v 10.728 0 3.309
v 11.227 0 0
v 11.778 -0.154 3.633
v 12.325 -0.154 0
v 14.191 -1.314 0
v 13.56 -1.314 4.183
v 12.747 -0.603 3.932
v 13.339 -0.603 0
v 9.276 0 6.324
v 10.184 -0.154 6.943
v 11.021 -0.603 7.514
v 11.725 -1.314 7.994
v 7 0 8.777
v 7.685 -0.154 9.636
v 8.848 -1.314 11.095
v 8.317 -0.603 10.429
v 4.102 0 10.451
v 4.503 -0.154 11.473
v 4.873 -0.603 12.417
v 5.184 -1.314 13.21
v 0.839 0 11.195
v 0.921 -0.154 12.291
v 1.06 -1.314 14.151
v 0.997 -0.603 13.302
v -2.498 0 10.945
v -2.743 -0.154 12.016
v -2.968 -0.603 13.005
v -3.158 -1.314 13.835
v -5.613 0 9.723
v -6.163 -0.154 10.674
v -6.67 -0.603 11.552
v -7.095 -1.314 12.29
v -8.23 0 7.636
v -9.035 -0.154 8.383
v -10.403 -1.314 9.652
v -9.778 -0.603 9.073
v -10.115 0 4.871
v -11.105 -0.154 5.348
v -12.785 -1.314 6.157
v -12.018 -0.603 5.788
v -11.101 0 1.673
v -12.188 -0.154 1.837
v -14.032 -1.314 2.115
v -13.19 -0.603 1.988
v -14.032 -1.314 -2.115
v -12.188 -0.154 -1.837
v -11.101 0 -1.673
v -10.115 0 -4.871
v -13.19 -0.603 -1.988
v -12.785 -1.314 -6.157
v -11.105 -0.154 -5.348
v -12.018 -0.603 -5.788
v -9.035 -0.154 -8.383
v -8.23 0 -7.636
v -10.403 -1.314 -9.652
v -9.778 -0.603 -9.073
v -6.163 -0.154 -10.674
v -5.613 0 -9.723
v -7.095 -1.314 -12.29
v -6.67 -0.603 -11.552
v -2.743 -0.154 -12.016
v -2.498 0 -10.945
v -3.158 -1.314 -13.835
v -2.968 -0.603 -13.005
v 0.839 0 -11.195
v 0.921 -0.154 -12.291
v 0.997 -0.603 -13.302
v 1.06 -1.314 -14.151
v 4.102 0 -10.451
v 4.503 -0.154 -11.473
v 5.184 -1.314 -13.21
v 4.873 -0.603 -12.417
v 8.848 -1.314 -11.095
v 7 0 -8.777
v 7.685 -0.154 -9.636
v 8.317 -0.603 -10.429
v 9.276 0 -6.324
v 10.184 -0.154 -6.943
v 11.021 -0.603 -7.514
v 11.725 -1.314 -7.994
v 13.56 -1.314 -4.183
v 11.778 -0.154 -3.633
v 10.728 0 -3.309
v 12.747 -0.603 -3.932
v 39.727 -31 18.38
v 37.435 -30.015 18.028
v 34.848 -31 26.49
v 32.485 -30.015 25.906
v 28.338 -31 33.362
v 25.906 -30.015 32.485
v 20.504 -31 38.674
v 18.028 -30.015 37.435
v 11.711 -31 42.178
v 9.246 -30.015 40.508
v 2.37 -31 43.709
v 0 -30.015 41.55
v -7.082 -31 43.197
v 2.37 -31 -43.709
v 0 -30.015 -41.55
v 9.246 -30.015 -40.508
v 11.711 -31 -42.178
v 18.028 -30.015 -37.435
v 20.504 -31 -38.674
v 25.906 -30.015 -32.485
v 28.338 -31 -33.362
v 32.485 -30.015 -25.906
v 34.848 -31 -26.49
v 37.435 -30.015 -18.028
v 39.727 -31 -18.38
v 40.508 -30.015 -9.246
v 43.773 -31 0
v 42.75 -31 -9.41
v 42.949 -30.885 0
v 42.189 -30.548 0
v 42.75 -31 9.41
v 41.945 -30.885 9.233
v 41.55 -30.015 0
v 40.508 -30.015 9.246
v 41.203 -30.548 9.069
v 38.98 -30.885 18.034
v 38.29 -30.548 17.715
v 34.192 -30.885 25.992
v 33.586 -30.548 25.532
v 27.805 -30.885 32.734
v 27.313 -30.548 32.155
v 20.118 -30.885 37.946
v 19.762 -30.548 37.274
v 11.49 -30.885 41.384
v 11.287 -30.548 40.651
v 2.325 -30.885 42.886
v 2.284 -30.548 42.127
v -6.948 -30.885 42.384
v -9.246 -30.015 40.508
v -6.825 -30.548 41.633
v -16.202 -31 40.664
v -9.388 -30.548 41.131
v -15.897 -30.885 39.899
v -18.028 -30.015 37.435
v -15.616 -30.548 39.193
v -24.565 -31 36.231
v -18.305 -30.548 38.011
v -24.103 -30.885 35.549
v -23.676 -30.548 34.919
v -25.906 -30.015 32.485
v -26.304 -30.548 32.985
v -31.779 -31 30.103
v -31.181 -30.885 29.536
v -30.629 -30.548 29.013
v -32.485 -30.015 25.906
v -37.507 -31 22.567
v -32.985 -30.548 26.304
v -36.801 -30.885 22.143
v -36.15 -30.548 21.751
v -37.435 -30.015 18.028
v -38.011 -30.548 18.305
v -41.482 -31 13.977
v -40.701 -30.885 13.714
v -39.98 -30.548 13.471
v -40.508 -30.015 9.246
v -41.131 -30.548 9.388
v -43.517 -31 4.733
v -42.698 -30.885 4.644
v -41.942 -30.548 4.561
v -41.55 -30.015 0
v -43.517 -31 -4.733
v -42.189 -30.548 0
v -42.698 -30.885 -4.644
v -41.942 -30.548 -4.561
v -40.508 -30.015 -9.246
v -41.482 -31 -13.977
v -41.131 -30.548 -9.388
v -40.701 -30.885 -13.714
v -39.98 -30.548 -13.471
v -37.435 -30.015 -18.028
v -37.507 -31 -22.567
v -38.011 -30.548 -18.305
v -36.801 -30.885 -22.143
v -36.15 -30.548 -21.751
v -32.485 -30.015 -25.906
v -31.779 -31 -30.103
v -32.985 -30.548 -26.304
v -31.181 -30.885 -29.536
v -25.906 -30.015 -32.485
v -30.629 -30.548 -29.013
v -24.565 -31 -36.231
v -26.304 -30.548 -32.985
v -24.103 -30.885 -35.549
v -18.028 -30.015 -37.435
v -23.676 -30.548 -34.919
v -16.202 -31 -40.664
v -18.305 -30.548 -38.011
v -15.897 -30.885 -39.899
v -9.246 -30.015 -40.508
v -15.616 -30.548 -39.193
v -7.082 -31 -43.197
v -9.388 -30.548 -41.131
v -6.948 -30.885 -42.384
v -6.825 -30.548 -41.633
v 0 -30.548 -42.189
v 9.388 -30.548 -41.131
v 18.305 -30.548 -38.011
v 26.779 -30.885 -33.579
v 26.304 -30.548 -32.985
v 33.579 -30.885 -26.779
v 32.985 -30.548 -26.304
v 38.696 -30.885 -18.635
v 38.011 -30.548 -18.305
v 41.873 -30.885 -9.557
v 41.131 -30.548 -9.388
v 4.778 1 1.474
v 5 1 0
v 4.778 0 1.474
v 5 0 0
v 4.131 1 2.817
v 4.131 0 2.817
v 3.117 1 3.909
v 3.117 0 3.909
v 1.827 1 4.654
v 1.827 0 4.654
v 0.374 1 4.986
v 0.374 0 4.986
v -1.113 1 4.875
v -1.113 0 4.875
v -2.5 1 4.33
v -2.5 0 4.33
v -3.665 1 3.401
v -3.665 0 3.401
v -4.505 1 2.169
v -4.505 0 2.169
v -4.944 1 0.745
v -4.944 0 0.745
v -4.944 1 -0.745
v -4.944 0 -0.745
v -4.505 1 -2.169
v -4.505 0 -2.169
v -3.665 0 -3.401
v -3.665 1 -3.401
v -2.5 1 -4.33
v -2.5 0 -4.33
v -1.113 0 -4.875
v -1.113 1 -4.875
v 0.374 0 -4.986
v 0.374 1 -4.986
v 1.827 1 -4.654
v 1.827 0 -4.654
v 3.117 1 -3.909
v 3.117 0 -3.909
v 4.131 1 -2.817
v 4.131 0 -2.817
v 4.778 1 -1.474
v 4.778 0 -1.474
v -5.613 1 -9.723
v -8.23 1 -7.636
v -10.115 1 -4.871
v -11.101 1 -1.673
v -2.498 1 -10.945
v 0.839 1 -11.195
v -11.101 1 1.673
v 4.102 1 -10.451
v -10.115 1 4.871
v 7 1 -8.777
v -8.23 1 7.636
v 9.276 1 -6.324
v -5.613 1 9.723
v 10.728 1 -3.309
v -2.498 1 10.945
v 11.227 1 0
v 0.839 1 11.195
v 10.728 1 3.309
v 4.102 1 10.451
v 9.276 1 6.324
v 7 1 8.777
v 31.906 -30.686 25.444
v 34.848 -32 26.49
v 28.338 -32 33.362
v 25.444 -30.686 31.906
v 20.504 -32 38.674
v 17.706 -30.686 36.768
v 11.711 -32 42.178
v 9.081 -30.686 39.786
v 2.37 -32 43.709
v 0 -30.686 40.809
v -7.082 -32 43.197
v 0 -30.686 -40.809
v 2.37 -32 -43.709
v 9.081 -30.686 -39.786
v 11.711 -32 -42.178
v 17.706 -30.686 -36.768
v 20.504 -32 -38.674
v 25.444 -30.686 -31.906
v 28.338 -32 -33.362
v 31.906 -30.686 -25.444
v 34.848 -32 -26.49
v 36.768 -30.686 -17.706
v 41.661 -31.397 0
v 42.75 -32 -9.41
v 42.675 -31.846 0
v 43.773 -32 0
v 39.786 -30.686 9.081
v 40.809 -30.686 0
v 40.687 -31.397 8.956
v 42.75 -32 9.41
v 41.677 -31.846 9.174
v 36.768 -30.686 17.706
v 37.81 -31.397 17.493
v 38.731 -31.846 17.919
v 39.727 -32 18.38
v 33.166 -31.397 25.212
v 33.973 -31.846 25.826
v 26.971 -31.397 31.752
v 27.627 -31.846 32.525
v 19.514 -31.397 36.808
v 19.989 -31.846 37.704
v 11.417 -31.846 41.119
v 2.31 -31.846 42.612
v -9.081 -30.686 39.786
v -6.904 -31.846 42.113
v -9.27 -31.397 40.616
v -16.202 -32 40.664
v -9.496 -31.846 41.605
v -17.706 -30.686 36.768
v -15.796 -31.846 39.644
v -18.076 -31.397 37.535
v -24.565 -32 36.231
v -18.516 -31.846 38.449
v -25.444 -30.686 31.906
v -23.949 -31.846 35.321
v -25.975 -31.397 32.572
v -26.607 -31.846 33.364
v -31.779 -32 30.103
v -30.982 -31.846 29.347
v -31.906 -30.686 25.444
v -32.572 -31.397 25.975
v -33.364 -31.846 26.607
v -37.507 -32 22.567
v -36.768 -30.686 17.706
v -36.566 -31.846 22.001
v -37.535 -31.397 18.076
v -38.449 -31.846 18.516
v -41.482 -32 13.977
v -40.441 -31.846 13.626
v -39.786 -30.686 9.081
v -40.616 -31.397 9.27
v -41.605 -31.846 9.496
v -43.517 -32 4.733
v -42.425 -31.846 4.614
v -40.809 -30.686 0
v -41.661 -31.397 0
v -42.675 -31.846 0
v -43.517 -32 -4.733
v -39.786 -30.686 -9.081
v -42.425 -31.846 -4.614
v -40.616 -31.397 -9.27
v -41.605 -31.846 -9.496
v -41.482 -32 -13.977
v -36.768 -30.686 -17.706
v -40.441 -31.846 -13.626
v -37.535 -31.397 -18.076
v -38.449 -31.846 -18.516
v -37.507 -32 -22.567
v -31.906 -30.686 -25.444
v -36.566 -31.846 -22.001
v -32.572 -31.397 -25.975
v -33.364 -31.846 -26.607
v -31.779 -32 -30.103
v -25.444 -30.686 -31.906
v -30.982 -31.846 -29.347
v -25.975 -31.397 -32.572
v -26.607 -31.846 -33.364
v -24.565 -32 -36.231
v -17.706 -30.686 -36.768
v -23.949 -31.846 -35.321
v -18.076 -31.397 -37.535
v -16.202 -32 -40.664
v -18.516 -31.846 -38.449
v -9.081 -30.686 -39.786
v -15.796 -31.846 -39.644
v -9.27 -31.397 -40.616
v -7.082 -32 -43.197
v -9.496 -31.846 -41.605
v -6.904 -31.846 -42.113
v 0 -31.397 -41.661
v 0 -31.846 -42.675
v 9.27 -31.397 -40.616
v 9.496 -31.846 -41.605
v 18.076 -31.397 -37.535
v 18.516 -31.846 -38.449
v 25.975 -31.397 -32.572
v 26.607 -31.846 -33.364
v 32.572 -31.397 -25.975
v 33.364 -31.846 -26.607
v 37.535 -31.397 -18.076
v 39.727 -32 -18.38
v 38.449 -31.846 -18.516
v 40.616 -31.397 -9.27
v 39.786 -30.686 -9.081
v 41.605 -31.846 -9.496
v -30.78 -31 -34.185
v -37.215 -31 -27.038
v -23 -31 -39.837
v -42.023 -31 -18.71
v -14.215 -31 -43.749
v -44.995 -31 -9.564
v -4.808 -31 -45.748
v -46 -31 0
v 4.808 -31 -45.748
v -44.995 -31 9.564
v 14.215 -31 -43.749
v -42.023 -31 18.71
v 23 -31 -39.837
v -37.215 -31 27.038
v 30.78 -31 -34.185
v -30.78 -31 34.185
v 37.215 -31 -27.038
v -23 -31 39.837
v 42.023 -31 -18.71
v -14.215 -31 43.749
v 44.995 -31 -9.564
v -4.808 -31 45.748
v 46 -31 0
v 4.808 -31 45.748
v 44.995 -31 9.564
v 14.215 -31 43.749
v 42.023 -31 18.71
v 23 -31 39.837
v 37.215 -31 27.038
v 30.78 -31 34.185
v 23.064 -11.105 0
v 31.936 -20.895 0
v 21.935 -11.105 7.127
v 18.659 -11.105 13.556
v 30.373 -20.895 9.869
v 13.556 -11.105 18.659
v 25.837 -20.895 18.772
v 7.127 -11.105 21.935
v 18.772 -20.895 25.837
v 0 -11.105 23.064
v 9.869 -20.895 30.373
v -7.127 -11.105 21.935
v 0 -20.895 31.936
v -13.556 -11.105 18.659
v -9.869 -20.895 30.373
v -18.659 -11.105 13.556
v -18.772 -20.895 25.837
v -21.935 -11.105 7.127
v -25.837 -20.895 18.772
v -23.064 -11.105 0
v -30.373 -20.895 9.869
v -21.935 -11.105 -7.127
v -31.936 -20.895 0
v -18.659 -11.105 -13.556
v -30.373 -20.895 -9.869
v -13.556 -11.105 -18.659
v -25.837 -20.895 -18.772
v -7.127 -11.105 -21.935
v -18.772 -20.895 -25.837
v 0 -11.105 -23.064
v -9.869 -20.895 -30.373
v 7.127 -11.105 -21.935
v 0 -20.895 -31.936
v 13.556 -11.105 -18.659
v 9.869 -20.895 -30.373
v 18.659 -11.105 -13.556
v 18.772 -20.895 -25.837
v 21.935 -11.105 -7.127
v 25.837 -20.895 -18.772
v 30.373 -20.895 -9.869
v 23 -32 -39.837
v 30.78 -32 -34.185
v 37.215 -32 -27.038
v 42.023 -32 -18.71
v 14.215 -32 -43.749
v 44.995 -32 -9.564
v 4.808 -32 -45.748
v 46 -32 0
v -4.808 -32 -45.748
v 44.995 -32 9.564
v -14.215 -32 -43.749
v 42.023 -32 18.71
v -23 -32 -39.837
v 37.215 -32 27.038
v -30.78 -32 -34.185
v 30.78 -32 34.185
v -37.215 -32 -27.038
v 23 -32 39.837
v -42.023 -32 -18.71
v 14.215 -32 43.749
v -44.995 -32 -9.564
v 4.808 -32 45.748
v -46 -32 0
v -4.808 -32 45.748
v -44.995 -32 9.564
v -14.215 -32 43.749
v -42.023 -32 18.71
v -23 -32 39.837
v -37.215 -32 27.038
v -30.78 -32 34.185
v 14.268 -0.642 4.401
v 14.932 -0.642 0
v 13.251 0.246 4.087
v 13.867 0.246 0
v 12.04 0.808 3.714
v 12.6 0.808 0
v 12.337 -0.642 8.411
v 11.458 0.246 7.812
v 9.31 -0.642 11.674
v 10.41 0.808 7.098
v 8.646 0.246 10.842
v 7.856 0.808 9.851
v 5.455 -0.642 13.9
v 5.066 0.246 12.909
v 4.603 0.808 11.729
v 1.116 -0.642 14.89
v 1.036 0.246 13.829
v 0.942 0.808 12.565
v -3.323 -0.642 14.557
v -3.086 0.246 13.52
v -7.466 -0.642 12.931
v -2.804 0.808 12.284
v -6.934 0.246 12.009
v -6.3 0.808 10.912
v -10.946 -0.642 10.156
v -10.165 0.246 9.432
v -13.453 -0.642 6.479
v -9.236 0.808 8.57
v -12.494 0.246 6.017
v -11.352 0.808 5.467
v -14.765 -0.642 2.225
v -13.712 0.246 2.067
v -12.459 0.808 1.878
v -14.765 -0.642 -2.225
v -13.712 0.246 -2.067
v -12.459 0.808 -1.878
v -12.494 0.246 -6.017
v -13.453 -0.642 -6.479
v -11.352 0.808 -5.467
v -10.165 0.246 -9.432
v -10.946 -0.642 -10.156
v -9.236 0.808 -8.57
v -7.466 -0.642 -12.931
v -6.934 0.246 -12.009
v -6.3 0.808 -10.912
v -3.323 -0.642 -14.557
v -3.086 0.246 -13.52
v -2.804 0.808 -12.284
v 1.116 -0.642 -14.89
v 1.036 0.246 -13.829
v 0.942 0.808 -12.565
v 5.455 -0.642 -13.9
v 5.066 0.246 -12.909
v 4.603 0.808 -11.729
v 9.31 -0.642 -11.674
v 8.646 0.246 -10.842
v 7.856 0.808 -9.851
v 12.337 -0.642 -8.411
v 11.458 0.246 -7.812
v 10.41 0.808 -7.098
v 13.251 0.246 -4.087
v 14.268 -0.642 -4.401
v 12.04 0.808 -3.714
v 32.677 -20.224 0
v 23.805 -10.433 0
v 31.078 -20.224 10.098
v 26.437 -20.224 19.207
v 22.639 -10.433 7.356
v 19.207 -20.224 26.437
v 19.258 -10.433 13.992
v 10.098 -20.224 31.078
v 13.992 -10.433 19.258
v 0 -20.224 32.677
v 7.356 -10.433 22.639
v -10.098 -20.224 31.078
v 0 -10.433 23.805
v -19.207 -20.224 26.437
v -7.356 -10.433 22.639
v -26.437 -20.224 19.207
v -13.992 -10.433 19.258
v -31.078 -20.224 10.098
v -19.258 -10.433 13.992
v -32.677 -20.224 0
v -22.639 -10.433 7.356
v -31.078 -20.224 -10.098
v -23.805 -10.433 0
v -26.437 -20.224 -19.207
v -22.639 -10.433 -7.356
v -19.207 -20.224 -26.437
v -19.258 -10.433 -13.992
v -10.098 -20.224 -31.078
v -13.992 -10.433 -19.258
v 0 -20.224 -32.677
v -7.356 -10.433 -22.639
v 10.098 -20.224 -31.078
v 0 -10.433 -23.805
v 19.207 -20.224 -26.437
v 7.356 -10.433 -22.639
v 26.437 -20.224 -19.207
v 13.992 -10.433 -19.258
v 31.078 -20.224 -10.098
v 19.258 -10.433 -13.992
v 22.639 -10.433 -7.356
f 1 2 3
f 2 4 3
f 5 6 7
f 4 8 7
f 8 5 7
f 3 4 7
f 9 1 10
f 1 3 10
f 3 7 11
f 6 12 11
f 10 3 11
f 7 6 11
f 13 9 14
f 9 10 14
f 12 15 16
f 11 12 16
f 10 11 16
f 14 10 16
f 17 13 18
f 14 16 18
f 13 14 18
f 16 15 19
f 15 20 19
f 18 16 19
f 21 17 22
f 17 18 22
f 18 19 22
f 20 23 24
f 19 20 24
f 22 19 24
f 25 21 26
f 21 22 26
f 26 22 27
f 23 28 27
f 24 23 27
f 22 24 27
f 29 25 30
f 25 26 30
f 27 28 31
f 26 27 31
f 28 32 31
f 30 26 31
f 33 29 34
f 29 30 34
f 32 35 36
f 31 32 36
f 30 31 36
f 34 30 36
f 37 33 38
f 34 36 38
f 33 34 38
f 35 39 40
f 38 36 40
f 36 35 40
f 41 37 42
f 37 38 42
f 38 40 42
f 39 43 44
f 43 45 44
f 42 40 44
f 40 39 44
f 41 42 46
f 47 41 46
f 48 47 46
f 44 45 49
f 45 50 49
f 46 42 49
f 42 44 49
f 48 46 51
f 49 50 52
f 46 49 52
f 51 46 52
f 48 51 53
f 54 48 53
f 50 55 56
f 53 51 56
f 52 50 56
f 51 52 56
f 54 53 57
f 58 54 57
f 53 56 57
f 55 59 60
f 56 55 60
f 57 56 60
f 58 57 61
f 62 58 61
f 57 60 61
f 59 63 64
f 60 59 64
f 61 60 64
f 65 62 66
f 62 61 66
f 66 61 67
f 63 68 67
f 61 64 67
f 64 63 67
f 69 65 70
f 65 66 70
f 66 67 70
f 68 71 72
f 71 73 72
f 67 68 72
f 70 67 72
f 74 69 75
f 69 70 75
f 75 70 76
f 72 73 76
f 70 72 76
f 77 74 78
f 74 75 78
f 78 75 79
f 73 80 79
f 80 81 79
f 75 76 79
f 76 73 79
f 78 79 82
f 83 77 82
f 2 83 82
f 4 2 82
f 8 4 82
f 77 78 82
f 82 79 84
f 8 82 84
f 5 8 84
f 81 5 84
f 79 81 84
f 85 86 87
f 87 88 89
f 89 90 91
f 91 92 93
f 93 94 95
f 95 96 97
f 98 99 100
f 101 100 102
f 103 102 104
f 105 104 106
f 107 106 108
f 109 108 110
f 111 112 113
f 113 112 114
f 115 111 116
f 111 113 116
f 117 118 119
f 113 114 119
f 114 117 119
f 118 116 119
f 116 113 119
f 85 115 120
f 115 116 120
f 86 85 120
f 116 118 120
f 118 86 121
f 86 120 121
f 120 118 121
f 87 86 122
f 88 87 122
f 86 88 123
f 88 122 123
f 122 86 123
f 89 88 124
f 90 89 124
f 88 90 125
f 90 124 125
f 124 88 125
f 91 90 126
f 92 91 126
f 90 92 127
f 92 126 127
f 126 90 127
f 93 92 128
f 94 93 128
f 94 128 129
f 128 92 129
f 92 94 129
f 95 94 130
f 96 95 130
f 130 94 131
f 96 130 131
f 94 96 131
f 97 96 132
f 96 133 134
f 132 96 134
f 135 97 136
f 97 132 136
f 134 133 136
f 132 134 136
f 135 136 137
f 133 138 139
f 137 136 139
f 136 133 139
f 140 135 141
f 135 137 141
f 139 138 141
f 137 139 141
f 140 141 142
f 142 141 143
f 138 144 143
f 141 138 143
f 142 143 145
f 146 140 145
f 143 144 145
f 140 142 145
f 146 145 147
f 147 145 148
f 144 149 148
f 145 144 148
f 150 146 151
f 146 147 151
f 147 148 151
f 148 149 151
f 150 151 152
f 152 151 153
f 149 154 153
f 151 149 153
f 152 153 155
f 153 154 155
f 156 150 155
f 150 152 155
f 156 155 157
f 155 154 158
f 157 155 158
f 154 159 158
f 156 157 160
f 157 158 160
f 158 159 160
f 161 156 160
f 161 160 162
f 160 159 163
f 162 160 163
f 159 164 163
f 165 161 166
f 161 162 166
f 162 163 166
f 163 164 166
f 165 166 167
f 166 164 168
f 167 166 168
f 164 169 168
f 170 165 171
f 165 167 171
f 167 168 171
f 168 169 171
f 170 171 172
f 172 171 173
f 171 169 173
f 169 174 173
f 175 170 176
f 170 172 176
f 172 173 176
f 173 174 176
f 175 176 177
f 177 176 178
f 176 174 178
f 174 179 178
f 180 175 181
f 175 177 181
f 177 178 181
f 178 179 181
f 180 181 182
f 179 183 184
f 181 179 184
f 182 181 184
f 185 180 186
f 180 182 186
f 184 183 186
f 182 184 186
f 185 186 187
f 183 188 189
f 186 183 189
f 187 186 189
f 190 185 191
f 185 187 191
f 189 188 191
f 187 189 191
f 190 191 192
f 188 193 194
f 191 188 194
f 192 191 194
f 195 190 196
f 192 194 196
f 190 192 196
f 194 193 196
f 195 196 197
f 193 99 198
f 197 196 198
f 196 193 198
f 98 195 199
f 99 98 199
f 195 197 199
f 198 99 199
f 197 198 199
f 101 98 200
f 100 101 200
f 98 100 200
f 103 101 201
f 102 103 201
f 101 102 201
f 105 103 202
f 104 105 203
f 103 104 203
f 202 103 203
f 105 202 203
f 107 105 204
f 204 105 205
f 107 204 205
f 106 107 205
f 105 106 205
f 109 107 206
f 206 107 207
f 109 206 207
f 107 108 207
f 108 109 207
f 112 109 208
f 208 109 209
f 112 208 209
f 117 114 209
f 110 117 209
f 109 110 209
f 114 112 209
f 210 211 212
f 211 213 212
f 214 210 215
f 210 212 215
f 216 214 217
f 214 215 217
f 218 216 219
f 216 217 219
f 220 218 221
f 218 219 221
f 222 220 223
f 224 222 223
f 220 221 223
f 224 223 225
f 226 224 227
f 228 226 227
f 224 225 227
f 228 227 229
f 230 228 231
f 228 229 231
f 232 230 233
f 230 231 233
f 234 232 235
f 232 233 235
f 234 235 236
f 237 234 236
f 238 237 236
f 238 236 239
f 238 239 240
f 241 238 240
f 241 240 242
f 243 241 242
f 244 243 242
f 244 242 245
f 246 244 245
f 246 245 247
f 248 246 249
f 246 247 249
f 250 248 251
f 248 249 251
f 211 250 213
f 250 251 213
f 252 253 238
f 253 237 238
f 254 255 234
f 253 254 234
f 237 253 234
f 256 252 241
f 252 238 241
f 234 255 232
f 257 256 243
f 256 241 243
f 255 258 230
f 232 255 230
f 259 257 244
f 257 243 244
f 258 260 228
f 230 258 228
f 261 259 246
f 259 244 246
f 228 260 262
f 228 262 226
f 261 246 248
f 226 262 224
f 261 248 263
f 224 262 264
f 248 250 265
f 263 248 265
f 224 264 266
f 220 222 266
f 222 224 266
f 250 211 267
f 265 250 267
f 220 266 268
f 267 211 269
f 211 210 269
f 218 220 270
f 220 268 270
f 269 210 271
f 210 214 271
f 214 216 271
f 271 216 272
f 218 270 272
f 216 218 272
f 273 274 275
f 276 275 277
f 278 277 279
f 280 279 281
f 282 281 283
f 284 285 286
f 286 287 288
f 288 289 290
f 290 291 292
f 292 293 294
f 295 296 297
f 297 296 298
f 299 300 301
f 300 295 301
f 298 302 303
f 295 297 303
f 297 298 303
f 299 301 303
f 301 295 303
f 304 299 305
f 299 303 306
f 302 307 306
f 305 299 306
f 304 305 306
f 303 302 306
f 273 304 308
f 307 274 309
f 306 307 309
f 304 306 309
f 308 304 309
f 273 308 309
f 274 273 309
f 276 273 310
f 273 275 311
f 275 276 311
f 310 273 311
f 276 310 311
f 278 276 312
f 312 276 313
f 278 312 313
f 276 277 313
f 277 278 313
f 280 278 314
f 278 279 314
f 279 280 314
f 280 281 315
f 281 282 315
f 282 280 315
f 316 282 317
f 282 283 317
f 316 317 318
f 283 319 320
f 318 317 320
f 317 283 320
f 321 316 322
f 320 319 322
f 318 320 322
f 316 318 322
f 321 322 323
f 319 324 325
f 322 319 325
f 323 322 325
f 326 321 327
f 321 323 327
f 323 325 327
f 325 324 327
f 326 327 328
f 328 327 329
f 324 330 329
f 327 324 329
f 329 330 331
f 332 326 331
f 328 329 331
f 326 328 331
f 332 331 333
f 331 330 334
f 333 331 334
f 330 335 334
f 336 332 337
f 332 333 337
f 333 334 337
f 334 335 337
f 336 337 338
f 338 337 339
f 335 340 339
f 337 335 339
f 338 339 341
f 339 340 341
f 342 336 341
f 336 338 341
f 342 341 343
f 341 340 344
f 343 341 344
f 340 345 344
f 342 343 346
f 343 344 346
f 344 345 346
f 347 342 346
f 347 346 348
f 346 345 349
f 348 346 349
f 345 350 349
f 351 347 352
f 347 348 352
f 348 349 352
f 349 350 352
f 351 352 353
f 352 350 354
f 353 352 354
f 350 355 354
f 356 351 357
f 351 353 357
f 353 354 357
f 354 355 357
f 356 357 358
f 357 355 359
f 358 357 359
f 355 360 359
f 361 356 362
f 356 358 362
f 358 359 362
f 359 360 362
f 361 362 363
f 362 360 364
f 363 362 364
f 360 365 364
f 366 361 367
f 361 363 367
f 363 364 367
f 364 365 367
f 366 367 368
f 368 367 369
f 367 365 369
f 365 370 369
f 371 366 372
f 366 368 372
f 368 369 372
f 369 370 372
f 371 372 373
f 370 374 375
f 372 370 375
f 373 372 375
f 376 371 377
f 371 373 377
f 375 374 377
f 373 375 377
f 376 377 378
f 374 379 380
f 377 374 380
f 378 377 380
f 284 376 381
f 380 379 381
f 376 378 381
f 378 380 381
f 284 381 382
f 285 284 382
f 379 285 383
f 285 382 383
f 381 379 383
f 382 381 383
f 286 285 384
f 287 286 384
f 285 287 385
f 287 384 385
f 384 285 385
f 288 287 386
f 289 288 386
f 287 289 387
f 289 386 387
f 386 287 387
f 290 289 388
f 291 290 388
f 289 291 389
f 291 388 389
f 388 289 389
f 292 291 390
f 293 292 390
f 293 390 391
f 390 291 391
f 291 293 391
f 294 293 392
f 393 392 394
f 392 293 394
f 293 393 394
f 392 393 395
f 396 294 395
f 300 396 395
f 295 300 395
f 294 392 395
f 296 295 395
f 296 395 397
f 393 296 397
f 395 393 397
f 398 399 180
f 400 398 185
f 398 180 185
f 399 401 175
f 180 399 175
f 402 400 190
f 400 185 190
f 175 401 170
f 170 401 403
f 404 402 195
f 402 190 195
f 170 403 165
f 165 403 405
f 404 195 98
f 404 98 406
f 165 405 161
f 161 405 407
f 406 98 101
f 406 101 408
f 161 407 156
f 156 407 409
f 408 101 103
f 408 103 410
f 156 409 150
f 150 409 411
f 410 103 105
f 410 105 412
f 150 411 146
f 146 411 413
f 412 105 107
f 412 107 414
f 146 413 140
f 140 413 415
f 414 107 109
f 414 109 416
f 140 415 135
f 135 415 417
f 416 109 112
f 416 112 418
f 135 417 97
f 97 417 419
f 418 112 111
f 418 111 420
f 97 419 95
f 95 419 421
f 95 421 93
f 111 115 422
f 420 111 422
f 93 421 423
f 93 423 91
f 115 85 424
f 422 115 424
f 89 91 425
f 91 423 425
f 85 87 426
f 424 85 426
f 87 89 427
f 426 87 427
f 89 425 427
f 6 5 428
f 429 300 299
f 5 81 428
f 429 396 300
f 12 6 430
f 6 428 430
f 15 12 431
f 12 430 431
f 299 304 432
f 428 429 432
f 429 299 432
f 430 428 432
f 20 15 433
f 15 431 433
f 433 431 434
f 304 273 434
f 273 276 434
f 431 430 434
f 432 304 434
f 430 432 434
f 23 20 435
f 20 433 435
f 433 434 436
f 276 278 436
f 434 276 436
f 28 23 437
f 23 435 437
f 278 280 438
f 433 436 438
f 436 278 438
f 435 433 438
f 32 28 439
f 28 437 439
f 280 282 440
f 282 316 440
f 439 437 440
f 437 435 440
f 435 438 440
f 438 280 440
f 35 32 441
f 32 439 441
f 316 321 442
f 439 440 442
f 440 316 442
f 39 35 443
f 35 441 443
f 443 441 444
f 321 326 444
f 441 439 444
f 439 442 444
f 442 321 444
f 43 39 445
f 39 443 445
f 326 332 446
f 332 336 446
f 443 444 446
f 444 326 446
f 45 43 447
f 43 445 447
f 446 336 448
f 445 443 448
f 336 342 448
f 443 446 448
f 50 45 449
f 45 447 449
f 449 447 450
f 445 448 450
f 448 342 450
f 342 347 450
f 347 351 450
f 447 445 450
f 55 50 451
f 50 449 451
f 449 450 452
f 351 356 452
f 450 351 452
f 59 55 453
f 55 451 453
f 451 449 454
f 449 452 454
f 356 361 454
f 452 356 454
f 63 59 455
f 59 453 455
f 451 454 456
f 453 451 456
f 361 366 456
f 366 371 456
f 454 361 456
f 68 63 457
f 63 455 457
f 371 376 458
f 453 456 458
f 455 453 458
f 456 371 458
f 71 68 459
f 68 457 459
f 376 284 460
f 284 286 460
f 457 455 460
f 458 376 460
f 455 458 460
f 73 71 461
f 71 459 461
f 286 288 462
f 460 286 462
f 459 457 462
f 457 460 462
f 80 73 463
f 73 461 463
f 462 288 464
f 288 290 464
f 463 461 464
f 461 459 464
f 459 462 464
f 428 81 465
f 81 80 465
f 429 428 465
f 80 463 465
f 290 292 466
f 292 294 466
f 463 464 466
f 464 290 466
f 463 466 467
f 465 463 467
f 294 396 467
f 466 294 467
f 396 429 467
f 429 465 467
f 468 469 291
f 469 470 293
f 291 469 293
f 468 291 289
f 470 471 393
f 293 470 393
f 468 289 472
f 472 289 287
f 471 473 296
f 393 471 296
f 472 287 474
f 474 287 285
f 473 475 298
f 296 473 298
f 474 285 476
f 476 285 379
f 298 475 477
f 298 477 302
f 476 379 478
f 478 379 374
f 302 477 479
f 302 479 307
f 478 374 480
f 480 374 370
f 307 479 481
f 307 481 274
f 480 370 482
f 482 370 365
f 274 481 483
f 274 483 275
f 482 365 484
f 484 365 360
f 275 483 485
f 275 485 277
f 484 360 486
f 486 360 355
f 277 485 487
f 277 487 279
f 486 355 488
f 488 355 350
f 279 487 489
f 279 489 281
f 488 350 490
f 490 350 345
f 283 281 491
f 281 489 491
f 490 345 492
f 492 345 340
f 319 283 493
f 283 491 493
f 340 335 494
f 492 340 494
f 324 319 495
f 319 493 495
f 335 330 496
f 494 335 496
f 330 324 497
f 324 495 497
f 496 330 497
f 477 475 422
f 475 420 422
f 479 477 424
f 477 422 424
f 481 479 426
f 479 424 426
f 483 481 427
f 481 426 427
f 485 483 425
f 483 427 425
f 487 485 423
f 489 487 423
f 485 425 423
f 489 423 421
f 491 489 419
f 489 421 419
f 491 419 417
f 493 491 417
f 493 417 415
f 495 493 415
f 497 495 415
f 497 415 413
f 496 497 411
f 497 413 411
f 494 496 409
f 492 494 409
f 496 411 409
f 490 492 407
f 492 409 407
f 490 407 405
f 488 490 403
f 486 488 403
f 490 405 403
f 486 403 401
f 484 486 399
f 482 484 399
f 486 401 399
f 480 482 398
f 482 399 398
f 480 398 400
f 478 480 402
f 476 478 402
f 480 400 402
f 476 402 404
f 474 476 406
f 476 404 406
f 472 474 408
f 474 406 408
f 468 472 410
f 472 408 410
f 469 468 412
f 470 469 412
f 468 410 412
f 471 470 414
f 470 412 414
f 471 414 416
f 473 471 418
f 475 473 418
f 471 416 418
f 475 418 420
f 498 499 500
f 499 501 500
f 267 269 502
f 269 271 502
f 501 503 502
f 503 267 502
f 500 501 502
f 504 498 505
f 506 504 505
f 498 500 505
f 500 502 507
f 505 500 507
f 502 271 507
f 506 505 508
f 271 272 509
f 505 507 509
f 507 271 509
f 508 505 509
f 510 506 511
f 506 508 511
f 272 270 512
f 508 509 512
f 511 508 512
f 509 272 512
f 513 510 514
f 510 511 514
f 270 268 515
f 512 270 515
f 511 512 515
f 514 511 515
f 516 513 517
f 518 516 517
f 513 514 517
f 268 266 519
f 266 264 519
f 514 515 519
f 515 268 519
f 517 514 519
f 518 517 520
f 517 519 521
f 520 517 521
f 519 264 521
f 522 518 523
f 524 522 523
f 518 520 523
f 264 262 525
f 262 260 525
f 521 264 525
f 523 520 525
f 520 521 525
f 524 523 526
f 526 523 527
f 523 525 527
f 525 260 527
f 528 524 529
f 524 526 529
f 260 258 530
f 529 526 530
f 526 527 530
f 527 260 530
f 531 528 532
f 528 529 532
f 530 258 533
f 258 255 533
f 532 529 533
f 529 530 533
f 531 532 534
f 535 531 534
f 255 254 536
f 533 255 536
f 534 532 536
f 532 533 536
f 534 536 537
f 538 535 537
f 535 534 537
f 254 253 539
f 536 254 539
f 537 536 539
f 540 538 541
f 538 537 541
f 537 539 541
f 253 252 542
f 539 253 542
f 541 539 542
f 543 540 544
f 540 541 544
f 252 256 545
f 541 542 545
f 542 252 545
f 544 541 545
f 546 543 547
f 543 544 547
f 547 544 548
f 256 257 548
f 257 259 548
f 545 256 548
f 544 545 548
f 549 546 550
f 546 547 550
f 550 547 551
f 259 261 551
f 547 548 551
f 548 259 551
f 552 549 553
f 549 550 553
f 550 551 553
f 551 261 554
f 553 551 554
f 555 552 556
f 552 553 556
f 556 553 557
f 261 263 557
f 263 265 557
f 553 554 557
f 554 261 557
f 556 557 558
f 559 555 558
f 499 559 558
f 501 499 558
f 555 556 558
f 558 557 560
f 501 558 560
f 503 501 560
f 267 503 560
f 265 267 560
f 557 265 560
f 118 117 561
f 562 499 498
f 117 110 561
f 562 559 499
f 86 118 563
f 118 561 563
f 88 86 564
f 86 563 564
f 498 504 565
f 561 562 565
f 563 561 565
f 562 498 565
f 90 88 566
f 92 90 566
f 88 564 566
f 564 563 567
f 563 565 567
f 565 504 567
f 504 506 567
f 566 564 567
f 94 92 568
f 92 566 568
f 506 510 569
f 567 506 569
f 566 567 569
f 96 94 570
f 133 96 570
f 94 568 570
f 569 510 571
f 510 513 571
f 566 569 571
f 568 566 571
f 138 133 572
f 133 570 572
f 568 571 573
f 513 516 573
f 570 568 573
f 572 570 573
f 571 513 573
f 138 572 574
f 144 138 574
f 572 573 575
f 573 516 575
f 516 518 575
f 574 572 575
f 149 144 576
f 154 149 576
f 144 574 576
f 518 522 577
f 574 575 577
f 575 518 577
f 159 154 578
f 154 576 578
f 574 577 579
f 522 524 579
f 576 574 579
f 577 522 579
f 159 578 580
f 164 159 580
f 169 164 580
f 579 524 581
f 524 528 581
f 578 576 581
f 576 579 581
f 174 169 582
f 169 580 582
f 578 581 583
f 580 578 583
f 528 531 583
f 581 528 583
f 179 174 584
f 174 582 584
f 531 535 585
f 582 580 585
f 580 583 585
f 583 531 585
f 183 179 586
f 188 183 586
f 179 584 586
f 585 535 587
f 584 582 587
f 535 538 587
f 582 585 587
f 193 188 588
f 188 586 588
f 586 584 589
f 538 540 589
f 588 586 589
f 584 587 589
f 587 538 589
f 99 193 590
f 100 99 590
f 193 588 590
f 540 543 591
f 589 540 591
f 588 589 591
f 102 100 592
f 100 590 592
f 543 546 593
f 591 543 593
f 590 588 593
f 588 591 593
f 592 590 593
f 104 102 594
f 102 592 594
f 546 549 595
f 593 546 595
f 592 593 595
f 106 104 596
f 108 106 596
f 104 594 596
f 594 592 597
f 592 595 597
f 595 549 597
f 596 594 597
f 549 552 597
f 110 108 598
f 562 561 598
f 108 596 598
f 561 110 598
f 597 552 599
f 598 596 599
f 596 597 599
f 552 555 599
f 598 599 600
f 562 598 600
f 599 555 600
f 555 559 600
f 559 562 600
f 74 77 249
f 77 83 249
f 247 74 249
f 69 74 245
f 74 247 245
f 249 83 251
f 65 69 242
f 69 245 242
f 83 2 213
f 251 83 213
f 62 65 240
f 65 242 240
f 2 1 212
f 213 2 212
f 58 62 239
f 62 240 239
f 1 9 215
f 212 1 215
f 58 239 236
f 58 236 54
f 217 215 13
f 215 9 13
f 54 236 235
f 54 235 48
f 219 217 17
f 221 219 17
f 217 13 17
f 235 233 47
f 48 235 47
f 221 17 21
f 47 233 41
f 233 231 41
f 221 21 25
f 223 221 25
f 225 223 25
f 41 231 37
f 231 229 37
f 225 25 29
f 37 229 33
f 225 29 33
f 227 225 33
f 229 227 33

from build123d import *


with BuildPart() as part:
    # Sketch1 → Revolve-Thin1 (revolve)
    with BuildSketch(Plane.XY):
        with BuildLine():
            Line((5, 0), (11.22679428, 0))
            ThreePointArc((11.22679428, 0), (12.84785708, -0.343204217), (14.190742085, -1.313922301))
            Line((14.190742085, -1.313922301), (40.809257915, -30.686077699))
            ThreePointArc((40.809257915, -30.686077699), (42.15214292, -31.656795783), (43.77320572, -32))
            Line((43.77320572, -32), (46, -32))
            Line((46, -32), (46, -31))
            Line((46, -31), (43.77320572, -31))
            ThreePointArc((43.77320572, -31), (42.55740862, -30.742596837), (41.550244866, -30.014558274))
            Line((41.550244866, -30.014558274), (14.931729037, -0.642402876))
            ThreePointArc((14.931729037, -0.642402876), (13.25312278, 0.570994729), (11.22679428, 1))
            Line((11.22679428, 1), (5, 1))
            Line((5, 1), (5, 0))
        make_face()
    revolve(axis=Axis((0, 23.415841584, 0), (0, -1, 0)))


solid = part.part
